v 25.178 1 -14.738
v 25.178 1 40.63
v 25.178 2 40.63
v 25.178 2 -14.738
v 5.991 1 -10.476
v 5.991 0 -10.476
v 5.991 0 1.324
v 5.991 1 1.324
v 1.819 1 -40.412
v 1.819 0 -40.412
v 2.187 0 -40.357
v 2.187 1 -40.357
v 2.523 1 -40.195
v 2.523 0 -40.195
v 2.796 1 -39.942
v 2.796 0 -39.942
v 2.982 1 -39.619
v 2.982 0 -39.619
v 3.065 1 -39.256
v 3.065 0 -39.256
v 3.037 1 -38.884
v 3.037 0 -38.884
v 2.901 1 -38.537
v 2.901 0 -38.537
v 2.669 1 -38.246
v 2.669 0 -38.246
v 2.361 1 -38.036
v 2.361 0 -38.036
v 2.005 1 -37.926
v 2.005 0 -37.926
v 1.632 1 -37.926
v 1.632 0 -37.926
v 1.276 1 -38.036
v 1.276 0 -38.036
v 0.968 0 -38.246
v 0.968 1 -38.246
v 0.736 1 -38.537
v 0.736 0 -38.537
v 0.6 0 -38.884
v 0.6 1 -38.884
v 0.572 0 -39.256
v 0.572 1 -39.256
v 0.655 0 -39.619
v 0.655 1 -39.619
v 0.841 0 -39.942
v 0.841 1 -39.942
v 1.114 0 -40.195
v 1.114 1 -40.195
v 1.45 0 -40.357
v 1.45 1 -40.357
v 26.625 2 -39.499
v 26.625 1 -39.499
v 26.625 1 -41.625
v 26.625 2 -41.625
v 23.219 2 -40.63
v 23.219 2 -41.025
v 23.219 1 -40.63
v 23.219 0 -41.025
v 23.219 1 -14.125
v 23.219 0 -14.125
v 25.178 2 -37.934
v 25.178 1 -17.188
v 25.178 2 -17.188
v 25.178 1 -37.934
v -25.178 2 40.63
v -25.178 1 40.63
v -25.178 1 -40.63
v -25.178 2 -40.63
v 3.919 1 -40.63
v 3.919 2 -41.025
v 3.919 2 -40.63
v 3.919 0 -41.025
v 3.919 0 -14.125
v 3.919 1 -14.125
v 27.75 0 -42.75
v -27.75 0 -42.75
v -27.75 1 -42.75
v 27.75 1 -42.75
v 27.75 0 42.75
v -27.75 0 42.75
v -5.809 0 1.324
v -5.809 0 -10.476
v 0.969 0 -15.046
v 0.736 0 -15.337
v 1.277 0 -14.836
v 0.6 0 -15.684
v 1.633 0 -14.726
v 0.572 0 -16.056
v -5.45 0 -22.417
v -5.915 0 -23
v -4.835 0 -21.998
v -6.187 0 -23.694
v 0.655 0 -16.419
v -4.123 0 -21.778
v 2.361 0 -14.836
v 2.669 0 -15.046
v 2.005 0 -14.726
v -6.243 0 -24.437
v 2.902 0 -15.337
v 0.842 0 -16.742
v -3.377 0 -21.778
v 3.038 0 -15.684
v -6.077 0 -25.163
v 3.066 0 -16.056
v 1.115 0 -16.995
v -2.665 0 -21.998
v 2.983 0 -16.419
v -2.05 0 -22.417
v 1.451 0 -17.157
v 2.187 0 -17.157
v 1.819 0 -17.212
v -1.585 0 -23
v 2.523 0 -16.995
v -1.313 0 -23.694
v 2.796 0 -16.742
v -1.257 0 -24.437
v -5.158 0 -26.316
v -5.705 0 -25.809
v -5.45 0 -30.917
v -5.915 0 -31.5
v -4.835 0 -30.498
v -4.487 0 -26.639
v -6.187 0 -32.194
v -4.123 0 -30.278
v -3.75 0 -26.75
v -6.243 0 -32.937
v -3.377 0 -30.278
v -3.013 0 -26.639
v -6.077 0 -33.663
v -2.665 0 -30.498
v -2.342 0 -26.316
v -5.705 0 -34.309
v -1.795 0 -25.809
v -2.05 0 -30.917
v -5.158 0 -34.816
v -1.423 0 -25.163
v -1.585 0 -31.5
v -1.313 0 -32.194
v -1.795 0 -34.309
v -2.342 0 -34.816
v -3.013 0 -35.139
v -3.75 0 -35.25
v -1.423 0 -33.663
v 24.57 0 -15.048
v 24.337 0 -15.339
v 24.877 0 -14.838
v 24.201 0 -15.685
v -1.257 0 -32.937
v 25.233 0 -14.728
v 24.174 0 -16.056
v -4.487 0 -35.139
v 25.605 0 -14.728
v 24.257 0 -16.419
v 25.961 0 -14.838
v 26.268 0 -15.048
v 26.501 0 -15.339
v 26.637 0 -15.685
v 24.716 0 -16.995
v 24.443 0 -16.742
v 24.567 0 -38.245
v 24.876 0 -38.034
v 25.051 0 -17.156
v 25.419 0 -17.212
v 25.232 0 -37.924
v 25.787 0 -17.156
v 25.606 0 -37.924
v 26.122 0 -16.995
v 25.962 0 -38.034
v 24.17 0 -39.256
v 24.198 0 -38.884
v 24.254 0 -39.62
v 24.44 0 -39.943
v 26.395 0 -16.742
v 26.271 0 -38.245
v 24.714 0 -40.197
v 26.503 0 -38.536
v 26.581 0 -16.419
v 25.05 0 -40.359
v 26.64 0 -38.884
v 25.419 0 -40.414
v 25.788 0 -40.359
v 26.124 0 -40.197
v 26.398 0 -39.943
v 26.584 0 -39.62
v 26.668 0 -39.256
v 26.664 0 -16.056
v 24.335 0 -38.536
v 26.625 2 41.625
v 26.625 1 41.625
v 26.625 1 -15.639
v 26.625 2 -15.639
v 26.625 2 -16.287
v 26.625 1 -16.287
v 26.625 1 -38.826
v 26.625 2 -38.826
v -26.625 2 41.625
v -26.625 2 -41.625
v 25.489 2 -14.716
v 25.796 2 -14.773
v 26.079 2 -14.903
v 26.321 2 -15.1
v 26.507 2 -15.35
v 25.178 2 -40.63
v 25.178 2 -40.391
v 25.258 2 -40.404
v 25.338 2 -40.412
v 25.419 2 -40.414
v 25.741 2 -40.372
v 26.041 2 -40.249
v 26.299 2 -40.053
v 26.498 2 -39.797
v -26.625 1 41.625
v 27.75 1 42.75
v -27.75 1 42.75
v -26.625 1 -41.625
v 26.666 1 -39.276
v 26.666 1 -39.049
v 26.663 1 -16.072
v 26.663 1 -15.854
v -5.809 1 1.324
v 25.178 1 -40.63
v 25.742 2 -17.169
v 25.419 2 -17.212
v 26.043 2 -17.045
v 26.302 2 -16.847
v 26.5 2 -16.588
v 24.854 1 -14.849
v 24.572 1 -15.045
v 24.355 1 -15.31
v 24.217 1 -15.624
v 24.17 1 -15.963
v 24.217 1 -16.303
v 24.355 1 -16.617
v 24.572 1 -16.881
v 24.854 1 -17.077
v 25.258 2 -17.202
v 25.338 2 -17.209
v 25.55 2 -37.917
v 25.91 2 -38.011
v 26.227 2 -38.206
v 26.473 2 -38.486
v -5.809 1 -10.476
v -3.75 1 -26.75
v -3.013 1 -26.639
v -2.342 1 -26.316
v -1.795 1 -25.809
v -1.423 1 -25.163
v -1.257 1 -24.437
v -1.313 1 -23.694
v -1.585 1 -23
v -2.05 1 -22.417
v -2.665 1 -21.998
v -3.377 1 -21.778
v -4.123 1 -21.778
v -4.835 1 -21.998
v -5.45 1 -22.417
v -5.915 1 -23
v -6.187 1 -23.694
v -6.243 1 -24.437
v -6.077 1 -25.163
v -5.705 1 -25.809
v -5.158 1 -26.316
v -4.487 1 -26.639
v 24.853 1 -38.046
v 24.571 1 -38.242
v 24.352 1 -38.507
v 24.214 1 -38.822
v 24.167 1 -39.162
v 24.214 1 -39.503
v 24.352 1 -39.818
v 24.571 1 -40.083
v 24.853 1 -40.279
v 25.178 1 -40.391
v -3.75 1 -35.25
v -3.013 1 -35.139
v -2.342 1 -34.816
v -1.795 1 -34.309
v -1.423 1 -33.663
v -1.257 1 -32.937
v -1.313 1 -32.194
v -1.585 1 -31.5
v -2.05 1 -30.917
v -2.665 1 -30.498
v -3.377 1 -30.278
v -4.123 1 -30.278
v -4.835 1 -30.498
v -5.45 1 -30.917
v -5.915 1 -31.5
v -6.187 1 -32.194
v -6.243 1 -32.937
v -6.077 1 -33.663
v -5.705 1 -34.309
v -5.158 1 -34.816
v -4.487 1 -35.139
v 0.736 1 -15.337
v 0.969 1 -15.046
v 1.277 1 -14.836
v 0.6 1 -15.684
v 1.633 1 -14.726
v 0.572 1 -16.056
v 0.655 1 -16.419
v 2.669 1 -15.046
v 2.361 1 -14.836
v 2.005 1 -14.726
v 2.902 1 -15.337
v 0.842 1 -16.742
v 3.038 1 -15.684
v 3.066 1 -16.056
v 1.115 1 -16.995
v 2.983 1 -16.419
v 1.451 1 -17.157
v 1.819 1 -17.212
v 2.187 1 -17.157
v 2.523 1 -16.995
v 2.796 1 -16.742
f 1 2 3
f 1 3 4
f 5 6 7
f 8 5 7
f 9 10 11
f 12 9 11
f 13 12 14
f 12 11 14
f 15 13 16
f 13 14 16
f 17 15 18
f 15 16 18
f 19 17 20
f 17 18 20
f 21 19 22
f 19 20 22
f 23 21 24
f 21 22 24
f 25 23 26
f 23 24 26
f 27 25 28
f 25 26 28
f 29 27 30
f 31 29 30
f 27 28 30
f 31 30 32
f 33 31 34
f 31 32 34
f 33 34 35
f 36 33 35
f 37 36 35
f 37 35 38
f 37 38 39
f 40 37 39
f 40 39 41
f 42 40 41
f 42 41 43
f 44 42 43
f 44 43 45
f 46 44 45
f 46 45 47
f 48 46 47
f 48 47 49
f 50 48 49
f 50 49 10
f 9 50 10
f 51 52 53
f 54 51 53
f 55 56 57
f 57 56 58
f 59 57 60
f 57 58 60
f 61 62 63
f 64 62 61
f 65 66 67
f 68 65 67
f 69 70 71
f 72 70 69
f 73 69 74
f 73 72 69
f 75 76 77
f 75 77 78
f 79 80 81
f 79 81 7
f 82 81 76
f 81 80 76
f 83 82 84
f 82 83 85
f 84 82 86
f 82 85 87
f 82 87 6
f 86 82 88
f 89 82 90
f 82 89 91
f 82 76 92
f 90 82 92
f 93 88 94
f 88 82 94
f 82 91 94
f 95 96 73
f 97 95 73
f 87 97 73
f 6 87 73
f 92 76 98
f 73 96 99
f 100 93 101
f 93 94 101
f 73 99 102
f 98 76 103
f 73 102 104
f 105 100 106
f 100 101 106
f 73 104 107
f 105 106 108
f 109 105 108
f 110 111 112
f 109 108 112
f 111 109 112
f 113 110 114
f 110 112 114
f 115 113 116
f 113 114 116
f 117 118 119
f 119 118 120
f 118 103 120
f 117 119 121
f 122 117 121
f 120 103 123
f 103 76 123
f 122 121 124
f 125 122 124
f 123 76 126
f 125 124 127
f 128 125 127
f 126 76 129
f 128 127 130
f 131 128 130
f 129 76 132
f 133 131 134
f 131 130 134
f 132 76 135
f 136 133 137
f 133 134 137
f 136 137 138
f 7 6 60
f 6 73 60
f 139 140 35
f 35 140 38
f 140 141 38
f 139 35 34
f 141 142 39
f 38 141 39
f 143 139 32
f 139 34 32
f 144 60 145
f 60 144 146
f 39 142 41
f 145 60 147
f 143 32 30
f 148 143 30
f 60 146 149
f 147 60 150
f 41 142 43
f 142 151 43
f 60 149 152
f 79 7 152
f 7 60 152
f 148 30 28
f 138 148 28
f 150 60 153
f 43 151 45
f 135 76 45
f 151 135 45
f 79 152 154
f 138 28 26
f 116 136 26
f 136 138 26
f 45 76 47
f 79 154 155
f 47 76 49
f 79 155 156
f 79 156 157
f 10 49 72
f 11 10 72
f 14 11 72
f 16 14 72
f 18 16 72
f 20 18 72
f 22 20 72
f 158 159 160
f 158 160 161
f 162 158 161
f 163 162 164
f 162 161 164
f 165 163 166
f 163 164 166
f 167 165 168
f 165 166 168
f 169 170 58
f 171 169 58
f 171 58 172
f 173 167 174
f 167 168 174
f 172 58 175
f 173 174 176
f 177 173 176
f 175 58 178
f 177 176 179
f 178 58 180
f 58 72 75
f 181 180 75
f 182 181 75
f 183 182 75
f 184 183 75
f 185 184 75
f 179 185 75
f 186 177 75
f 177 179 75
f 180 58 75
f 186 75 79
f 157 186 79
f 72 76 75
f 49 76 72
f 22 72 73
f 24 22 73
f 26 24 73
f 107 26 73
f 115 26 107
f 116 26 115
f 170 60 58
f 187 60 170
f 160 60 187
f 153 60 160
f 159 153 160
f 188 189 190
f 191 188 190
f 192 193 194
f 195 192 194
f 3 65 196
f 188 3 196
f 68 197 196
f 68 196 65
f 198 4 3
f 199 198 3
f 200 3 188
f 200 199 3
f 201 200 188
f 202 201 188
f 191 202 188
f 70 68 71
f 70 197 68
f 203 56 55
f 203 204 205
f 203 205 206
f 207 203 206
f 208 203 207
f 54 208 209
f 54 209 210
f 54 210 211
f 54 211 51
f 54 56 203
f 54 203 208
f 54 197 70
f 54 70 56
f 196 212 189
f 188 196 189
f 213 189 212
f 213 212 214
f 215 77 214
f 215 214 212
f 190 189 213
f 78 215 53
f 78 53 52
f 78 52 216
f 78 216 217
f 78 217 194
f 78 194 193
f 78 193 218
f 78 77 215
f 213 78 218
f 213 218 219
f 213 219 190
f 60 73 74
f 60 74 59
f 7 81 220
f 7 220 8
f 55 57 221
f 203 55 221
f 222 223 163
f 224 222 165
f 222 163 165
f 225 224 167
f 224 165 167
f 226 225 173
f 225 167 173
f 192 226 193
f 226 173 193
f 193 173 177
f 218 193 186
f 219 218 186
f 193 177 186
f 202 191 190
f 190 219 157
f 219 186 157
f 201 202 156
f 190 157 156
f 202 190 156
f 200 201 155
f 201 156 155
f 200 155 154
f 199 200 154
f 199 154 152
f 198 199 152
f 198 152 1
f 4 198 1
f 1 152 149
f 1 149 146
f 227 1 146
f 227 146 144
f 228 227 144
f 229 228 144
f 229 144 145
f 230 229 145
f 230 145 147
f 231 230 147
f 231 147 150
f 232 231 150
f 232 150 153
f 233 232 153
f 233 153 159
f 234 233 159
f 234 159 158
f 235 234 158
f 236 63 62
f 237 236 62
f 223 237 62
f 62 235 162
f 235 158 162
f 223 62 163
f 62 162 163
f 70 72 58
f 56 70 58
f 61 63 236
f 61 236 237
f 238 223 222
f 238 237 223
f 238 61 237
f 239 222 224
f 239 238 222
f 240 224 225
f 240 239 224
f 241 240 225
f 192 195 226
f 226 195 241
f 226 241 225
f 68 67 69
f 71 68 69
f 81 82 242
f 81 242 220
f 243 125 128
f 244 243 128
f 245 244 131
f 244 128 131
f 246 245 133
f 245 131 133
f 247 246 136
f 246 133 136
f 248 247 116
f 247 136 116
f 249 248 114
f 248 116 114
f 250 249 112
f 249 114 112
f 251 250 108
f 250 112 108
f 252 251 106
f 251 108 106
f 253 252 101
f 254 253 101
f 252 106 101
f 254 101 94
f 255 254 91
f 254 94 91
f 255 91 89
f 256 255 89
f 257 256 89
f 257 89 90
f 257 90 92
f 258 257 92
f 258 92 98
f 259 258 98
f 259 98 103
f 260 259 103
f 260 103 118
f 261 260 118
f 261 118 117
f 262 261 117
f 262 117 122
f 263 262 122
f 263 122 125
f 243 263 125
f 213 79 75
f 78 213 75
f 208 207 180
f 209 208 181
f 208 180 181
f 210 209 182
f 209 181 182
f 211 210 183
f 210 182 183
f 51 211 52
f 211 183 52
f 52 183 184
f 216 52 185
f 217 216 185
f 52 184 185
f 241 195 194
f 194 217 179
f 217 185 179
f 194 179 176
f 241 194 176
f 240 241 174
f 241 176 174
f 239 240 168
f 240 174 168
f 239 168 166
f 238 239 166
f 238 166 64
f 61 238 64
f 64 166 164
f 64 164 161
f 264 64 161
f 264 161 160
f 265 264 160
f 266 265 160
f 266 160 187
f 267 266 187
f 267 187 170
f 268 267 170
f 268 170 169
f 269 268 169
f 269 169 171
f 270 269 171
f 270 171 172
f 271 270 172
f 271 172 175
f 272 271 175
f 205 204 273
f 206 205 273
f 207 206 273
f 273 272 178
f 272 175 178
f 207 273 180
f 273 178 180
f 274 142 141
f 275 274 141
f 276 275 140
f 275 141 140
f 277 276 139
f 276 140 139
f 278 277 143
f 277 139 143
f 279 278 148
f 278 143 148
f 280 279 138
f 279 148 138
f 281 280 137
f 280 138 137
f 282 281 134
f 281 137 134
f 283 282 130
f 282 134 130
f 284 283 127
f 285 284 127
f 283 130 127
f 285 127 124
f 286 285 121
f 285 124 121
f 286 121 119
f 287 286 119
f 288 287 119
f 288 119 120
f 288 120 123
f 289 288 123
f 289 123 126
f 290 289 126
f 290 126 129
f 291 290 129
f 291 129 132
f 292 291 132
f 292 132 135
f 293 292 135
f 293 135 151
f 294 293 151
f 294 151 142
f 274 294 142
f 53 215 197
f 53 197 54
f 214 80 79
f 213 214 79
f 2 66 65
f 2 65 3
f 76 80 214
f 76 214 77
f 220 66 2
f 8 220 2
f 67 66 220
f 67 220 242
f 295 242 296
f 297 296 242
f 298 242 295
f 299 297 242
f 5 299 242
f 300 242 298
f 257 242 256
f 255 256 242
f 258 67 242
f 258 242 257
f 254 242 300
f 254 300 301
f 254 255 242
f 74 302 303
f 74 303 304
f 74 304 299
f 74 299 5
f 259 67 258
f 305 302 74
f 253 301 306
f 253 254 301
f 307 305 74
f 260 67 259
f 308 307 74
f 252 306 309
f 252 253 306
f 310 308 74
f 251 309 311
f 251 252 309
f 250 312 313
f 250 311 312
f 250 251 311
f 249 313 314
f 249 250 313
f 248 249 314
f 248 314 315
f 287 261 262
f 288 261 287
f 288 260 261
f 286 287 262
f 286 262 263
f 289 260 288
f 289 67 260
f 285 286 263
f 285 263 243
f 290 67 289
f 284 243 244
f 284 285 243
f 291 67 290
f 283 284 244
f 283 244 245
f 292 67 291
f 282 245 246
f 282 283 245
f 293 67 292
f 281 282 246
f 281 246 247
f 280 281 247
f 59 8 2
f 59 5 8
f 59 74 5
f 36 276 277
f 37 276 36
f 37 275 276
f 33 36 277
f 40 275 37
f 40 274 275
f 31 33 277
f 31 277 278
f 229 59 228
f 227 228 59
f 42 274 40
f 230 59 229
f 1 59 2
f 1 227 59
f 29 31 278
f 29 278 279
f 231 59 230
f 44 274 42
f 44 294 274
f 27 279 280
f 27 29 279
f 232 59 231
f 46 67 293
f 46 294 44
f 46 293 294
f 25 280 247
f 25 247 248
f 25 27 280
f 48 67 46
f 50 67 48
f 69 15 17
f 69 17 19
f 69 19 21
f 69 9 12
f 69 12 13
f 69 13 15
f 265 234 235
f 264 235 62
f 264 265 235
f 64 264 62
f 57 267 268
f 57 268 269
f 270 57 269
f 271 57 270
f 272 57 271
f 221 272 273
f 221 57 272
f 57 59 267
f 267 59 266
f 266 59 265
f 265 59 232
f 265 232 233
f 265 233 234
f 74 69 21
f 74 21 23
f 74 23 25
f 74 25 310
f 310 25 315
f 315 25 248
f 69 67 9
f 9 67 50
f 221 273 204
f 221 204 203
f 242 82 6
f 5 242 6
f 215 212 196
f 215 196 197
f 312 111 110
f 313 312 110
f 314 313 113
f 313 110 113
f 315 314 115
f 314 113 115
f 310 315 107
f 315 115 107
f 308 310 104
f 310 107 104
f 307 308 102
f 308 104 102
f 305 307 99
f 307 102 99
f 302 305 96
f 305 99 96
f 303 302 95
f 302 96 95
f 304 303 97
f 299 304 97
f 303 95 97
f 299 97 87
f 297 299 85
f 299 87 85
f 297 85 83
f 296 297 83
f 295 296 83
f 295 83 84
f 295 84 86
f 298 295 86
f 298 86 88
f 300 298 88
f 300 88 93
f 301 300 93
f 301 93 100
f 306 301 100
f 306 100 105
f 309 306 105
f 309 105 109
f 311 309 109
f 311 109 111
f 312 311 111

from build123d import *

# Parameters (mm, degrees)
SKETCH1_W           = 55.5
SKETCH1_H           = 85.5
BOSS_EXTRUDE1_DEPTH = 1
SKETCH2_W           = 53.25
SKETCH2_H           = 83.25
SKETCH2_W_2         = 50.3558552
SKETCH2_H_2         = 81.260119932
BOSS_EXTRUDE2_DEPTH = 1
SKETCH3_R           = 2.5
SKETCH3_R_2         = 1.25
SKETCH3_R_3         = 1.248818361
SKETCH3_R_4         = 1.252029075
SKETCH3_W           = 19.3
SKETCH3_H           = 26.9
SKETCH3_W_2         = 11.8
SKETCH3_H_2         = 11.8
CUT_EXTRUDE2_DEPTH  = 3


with BuildPart() as part:
    # Sketch1 → Boss-Extrude1 (new body)
    with BuildSketch(Plane(origin=(0, 0, 0), x_dir=(1, 0, 0), z_dir=(0, 1, 0))):
        Rectangle(SKETCH1_W, SKETCH1_H)
    extrude(amount=BOSS_EXTRUDE1_DEPTH)

    # Sketch2 → Boss-Extrude2 (add)
    with BuildSketch(Plane(origin=(0, 1, 0), x_dir=(1, 0, 0), z_dir=(0, 1, 0))):
        Rectangle(SKETCH2_W, SKETCH2_H)
        Rectangle(SKETCH2_W_2, SKETCH2_H_2, mode=Mode.SUBTRACT)
    extrude(amount=BOSS_EXTRUDE2_DEPTH)

    # Sketch3 → Cut-Extrude2 (cut)
    with BuildSketch(Plane.XZ):
        with Locations(Location((-3.75, -32.75, 0), (0, 0, 270))):
            Circle(SKETCH3_R)
        with Locations(Location((-3.75, -24.25, 0), (0, 0, 270))):
            Circle(SKETCH3_R)
        with Locations(Location((1.819004369, -15.96241079, 0), (0, 0, 270))):
            Circle(SKETCH3_R_2)
        with Locations(Location((25.419004357, -15.963142334, 0), (0, 0, 270))):
            Circle(SKETCH3_R_3)
        with Locations(Location((1.818587591, -39.162410787, 0), (0, 0, 270))):
            Circle(SKETCH3_R_2)
        with Locations(Location((25.419004357, -39.162410787, 0), (0, 0, 270))):
            Circle(SKETCH3_R_4)
        with Locations((13.569004369, -27.574665711)):
            Rectangle(SKETCH3_W, SKETCH3_H)
        with Locations((0.091347466, -4.575788212)):
            Rectangle(SKETCH3_W_2, SKETCH3_H_2)
    extrude(amount=-CUT_EXTRUDE2_DEPTH, mode=Mode.SUBTRACT)


solid = part.part
